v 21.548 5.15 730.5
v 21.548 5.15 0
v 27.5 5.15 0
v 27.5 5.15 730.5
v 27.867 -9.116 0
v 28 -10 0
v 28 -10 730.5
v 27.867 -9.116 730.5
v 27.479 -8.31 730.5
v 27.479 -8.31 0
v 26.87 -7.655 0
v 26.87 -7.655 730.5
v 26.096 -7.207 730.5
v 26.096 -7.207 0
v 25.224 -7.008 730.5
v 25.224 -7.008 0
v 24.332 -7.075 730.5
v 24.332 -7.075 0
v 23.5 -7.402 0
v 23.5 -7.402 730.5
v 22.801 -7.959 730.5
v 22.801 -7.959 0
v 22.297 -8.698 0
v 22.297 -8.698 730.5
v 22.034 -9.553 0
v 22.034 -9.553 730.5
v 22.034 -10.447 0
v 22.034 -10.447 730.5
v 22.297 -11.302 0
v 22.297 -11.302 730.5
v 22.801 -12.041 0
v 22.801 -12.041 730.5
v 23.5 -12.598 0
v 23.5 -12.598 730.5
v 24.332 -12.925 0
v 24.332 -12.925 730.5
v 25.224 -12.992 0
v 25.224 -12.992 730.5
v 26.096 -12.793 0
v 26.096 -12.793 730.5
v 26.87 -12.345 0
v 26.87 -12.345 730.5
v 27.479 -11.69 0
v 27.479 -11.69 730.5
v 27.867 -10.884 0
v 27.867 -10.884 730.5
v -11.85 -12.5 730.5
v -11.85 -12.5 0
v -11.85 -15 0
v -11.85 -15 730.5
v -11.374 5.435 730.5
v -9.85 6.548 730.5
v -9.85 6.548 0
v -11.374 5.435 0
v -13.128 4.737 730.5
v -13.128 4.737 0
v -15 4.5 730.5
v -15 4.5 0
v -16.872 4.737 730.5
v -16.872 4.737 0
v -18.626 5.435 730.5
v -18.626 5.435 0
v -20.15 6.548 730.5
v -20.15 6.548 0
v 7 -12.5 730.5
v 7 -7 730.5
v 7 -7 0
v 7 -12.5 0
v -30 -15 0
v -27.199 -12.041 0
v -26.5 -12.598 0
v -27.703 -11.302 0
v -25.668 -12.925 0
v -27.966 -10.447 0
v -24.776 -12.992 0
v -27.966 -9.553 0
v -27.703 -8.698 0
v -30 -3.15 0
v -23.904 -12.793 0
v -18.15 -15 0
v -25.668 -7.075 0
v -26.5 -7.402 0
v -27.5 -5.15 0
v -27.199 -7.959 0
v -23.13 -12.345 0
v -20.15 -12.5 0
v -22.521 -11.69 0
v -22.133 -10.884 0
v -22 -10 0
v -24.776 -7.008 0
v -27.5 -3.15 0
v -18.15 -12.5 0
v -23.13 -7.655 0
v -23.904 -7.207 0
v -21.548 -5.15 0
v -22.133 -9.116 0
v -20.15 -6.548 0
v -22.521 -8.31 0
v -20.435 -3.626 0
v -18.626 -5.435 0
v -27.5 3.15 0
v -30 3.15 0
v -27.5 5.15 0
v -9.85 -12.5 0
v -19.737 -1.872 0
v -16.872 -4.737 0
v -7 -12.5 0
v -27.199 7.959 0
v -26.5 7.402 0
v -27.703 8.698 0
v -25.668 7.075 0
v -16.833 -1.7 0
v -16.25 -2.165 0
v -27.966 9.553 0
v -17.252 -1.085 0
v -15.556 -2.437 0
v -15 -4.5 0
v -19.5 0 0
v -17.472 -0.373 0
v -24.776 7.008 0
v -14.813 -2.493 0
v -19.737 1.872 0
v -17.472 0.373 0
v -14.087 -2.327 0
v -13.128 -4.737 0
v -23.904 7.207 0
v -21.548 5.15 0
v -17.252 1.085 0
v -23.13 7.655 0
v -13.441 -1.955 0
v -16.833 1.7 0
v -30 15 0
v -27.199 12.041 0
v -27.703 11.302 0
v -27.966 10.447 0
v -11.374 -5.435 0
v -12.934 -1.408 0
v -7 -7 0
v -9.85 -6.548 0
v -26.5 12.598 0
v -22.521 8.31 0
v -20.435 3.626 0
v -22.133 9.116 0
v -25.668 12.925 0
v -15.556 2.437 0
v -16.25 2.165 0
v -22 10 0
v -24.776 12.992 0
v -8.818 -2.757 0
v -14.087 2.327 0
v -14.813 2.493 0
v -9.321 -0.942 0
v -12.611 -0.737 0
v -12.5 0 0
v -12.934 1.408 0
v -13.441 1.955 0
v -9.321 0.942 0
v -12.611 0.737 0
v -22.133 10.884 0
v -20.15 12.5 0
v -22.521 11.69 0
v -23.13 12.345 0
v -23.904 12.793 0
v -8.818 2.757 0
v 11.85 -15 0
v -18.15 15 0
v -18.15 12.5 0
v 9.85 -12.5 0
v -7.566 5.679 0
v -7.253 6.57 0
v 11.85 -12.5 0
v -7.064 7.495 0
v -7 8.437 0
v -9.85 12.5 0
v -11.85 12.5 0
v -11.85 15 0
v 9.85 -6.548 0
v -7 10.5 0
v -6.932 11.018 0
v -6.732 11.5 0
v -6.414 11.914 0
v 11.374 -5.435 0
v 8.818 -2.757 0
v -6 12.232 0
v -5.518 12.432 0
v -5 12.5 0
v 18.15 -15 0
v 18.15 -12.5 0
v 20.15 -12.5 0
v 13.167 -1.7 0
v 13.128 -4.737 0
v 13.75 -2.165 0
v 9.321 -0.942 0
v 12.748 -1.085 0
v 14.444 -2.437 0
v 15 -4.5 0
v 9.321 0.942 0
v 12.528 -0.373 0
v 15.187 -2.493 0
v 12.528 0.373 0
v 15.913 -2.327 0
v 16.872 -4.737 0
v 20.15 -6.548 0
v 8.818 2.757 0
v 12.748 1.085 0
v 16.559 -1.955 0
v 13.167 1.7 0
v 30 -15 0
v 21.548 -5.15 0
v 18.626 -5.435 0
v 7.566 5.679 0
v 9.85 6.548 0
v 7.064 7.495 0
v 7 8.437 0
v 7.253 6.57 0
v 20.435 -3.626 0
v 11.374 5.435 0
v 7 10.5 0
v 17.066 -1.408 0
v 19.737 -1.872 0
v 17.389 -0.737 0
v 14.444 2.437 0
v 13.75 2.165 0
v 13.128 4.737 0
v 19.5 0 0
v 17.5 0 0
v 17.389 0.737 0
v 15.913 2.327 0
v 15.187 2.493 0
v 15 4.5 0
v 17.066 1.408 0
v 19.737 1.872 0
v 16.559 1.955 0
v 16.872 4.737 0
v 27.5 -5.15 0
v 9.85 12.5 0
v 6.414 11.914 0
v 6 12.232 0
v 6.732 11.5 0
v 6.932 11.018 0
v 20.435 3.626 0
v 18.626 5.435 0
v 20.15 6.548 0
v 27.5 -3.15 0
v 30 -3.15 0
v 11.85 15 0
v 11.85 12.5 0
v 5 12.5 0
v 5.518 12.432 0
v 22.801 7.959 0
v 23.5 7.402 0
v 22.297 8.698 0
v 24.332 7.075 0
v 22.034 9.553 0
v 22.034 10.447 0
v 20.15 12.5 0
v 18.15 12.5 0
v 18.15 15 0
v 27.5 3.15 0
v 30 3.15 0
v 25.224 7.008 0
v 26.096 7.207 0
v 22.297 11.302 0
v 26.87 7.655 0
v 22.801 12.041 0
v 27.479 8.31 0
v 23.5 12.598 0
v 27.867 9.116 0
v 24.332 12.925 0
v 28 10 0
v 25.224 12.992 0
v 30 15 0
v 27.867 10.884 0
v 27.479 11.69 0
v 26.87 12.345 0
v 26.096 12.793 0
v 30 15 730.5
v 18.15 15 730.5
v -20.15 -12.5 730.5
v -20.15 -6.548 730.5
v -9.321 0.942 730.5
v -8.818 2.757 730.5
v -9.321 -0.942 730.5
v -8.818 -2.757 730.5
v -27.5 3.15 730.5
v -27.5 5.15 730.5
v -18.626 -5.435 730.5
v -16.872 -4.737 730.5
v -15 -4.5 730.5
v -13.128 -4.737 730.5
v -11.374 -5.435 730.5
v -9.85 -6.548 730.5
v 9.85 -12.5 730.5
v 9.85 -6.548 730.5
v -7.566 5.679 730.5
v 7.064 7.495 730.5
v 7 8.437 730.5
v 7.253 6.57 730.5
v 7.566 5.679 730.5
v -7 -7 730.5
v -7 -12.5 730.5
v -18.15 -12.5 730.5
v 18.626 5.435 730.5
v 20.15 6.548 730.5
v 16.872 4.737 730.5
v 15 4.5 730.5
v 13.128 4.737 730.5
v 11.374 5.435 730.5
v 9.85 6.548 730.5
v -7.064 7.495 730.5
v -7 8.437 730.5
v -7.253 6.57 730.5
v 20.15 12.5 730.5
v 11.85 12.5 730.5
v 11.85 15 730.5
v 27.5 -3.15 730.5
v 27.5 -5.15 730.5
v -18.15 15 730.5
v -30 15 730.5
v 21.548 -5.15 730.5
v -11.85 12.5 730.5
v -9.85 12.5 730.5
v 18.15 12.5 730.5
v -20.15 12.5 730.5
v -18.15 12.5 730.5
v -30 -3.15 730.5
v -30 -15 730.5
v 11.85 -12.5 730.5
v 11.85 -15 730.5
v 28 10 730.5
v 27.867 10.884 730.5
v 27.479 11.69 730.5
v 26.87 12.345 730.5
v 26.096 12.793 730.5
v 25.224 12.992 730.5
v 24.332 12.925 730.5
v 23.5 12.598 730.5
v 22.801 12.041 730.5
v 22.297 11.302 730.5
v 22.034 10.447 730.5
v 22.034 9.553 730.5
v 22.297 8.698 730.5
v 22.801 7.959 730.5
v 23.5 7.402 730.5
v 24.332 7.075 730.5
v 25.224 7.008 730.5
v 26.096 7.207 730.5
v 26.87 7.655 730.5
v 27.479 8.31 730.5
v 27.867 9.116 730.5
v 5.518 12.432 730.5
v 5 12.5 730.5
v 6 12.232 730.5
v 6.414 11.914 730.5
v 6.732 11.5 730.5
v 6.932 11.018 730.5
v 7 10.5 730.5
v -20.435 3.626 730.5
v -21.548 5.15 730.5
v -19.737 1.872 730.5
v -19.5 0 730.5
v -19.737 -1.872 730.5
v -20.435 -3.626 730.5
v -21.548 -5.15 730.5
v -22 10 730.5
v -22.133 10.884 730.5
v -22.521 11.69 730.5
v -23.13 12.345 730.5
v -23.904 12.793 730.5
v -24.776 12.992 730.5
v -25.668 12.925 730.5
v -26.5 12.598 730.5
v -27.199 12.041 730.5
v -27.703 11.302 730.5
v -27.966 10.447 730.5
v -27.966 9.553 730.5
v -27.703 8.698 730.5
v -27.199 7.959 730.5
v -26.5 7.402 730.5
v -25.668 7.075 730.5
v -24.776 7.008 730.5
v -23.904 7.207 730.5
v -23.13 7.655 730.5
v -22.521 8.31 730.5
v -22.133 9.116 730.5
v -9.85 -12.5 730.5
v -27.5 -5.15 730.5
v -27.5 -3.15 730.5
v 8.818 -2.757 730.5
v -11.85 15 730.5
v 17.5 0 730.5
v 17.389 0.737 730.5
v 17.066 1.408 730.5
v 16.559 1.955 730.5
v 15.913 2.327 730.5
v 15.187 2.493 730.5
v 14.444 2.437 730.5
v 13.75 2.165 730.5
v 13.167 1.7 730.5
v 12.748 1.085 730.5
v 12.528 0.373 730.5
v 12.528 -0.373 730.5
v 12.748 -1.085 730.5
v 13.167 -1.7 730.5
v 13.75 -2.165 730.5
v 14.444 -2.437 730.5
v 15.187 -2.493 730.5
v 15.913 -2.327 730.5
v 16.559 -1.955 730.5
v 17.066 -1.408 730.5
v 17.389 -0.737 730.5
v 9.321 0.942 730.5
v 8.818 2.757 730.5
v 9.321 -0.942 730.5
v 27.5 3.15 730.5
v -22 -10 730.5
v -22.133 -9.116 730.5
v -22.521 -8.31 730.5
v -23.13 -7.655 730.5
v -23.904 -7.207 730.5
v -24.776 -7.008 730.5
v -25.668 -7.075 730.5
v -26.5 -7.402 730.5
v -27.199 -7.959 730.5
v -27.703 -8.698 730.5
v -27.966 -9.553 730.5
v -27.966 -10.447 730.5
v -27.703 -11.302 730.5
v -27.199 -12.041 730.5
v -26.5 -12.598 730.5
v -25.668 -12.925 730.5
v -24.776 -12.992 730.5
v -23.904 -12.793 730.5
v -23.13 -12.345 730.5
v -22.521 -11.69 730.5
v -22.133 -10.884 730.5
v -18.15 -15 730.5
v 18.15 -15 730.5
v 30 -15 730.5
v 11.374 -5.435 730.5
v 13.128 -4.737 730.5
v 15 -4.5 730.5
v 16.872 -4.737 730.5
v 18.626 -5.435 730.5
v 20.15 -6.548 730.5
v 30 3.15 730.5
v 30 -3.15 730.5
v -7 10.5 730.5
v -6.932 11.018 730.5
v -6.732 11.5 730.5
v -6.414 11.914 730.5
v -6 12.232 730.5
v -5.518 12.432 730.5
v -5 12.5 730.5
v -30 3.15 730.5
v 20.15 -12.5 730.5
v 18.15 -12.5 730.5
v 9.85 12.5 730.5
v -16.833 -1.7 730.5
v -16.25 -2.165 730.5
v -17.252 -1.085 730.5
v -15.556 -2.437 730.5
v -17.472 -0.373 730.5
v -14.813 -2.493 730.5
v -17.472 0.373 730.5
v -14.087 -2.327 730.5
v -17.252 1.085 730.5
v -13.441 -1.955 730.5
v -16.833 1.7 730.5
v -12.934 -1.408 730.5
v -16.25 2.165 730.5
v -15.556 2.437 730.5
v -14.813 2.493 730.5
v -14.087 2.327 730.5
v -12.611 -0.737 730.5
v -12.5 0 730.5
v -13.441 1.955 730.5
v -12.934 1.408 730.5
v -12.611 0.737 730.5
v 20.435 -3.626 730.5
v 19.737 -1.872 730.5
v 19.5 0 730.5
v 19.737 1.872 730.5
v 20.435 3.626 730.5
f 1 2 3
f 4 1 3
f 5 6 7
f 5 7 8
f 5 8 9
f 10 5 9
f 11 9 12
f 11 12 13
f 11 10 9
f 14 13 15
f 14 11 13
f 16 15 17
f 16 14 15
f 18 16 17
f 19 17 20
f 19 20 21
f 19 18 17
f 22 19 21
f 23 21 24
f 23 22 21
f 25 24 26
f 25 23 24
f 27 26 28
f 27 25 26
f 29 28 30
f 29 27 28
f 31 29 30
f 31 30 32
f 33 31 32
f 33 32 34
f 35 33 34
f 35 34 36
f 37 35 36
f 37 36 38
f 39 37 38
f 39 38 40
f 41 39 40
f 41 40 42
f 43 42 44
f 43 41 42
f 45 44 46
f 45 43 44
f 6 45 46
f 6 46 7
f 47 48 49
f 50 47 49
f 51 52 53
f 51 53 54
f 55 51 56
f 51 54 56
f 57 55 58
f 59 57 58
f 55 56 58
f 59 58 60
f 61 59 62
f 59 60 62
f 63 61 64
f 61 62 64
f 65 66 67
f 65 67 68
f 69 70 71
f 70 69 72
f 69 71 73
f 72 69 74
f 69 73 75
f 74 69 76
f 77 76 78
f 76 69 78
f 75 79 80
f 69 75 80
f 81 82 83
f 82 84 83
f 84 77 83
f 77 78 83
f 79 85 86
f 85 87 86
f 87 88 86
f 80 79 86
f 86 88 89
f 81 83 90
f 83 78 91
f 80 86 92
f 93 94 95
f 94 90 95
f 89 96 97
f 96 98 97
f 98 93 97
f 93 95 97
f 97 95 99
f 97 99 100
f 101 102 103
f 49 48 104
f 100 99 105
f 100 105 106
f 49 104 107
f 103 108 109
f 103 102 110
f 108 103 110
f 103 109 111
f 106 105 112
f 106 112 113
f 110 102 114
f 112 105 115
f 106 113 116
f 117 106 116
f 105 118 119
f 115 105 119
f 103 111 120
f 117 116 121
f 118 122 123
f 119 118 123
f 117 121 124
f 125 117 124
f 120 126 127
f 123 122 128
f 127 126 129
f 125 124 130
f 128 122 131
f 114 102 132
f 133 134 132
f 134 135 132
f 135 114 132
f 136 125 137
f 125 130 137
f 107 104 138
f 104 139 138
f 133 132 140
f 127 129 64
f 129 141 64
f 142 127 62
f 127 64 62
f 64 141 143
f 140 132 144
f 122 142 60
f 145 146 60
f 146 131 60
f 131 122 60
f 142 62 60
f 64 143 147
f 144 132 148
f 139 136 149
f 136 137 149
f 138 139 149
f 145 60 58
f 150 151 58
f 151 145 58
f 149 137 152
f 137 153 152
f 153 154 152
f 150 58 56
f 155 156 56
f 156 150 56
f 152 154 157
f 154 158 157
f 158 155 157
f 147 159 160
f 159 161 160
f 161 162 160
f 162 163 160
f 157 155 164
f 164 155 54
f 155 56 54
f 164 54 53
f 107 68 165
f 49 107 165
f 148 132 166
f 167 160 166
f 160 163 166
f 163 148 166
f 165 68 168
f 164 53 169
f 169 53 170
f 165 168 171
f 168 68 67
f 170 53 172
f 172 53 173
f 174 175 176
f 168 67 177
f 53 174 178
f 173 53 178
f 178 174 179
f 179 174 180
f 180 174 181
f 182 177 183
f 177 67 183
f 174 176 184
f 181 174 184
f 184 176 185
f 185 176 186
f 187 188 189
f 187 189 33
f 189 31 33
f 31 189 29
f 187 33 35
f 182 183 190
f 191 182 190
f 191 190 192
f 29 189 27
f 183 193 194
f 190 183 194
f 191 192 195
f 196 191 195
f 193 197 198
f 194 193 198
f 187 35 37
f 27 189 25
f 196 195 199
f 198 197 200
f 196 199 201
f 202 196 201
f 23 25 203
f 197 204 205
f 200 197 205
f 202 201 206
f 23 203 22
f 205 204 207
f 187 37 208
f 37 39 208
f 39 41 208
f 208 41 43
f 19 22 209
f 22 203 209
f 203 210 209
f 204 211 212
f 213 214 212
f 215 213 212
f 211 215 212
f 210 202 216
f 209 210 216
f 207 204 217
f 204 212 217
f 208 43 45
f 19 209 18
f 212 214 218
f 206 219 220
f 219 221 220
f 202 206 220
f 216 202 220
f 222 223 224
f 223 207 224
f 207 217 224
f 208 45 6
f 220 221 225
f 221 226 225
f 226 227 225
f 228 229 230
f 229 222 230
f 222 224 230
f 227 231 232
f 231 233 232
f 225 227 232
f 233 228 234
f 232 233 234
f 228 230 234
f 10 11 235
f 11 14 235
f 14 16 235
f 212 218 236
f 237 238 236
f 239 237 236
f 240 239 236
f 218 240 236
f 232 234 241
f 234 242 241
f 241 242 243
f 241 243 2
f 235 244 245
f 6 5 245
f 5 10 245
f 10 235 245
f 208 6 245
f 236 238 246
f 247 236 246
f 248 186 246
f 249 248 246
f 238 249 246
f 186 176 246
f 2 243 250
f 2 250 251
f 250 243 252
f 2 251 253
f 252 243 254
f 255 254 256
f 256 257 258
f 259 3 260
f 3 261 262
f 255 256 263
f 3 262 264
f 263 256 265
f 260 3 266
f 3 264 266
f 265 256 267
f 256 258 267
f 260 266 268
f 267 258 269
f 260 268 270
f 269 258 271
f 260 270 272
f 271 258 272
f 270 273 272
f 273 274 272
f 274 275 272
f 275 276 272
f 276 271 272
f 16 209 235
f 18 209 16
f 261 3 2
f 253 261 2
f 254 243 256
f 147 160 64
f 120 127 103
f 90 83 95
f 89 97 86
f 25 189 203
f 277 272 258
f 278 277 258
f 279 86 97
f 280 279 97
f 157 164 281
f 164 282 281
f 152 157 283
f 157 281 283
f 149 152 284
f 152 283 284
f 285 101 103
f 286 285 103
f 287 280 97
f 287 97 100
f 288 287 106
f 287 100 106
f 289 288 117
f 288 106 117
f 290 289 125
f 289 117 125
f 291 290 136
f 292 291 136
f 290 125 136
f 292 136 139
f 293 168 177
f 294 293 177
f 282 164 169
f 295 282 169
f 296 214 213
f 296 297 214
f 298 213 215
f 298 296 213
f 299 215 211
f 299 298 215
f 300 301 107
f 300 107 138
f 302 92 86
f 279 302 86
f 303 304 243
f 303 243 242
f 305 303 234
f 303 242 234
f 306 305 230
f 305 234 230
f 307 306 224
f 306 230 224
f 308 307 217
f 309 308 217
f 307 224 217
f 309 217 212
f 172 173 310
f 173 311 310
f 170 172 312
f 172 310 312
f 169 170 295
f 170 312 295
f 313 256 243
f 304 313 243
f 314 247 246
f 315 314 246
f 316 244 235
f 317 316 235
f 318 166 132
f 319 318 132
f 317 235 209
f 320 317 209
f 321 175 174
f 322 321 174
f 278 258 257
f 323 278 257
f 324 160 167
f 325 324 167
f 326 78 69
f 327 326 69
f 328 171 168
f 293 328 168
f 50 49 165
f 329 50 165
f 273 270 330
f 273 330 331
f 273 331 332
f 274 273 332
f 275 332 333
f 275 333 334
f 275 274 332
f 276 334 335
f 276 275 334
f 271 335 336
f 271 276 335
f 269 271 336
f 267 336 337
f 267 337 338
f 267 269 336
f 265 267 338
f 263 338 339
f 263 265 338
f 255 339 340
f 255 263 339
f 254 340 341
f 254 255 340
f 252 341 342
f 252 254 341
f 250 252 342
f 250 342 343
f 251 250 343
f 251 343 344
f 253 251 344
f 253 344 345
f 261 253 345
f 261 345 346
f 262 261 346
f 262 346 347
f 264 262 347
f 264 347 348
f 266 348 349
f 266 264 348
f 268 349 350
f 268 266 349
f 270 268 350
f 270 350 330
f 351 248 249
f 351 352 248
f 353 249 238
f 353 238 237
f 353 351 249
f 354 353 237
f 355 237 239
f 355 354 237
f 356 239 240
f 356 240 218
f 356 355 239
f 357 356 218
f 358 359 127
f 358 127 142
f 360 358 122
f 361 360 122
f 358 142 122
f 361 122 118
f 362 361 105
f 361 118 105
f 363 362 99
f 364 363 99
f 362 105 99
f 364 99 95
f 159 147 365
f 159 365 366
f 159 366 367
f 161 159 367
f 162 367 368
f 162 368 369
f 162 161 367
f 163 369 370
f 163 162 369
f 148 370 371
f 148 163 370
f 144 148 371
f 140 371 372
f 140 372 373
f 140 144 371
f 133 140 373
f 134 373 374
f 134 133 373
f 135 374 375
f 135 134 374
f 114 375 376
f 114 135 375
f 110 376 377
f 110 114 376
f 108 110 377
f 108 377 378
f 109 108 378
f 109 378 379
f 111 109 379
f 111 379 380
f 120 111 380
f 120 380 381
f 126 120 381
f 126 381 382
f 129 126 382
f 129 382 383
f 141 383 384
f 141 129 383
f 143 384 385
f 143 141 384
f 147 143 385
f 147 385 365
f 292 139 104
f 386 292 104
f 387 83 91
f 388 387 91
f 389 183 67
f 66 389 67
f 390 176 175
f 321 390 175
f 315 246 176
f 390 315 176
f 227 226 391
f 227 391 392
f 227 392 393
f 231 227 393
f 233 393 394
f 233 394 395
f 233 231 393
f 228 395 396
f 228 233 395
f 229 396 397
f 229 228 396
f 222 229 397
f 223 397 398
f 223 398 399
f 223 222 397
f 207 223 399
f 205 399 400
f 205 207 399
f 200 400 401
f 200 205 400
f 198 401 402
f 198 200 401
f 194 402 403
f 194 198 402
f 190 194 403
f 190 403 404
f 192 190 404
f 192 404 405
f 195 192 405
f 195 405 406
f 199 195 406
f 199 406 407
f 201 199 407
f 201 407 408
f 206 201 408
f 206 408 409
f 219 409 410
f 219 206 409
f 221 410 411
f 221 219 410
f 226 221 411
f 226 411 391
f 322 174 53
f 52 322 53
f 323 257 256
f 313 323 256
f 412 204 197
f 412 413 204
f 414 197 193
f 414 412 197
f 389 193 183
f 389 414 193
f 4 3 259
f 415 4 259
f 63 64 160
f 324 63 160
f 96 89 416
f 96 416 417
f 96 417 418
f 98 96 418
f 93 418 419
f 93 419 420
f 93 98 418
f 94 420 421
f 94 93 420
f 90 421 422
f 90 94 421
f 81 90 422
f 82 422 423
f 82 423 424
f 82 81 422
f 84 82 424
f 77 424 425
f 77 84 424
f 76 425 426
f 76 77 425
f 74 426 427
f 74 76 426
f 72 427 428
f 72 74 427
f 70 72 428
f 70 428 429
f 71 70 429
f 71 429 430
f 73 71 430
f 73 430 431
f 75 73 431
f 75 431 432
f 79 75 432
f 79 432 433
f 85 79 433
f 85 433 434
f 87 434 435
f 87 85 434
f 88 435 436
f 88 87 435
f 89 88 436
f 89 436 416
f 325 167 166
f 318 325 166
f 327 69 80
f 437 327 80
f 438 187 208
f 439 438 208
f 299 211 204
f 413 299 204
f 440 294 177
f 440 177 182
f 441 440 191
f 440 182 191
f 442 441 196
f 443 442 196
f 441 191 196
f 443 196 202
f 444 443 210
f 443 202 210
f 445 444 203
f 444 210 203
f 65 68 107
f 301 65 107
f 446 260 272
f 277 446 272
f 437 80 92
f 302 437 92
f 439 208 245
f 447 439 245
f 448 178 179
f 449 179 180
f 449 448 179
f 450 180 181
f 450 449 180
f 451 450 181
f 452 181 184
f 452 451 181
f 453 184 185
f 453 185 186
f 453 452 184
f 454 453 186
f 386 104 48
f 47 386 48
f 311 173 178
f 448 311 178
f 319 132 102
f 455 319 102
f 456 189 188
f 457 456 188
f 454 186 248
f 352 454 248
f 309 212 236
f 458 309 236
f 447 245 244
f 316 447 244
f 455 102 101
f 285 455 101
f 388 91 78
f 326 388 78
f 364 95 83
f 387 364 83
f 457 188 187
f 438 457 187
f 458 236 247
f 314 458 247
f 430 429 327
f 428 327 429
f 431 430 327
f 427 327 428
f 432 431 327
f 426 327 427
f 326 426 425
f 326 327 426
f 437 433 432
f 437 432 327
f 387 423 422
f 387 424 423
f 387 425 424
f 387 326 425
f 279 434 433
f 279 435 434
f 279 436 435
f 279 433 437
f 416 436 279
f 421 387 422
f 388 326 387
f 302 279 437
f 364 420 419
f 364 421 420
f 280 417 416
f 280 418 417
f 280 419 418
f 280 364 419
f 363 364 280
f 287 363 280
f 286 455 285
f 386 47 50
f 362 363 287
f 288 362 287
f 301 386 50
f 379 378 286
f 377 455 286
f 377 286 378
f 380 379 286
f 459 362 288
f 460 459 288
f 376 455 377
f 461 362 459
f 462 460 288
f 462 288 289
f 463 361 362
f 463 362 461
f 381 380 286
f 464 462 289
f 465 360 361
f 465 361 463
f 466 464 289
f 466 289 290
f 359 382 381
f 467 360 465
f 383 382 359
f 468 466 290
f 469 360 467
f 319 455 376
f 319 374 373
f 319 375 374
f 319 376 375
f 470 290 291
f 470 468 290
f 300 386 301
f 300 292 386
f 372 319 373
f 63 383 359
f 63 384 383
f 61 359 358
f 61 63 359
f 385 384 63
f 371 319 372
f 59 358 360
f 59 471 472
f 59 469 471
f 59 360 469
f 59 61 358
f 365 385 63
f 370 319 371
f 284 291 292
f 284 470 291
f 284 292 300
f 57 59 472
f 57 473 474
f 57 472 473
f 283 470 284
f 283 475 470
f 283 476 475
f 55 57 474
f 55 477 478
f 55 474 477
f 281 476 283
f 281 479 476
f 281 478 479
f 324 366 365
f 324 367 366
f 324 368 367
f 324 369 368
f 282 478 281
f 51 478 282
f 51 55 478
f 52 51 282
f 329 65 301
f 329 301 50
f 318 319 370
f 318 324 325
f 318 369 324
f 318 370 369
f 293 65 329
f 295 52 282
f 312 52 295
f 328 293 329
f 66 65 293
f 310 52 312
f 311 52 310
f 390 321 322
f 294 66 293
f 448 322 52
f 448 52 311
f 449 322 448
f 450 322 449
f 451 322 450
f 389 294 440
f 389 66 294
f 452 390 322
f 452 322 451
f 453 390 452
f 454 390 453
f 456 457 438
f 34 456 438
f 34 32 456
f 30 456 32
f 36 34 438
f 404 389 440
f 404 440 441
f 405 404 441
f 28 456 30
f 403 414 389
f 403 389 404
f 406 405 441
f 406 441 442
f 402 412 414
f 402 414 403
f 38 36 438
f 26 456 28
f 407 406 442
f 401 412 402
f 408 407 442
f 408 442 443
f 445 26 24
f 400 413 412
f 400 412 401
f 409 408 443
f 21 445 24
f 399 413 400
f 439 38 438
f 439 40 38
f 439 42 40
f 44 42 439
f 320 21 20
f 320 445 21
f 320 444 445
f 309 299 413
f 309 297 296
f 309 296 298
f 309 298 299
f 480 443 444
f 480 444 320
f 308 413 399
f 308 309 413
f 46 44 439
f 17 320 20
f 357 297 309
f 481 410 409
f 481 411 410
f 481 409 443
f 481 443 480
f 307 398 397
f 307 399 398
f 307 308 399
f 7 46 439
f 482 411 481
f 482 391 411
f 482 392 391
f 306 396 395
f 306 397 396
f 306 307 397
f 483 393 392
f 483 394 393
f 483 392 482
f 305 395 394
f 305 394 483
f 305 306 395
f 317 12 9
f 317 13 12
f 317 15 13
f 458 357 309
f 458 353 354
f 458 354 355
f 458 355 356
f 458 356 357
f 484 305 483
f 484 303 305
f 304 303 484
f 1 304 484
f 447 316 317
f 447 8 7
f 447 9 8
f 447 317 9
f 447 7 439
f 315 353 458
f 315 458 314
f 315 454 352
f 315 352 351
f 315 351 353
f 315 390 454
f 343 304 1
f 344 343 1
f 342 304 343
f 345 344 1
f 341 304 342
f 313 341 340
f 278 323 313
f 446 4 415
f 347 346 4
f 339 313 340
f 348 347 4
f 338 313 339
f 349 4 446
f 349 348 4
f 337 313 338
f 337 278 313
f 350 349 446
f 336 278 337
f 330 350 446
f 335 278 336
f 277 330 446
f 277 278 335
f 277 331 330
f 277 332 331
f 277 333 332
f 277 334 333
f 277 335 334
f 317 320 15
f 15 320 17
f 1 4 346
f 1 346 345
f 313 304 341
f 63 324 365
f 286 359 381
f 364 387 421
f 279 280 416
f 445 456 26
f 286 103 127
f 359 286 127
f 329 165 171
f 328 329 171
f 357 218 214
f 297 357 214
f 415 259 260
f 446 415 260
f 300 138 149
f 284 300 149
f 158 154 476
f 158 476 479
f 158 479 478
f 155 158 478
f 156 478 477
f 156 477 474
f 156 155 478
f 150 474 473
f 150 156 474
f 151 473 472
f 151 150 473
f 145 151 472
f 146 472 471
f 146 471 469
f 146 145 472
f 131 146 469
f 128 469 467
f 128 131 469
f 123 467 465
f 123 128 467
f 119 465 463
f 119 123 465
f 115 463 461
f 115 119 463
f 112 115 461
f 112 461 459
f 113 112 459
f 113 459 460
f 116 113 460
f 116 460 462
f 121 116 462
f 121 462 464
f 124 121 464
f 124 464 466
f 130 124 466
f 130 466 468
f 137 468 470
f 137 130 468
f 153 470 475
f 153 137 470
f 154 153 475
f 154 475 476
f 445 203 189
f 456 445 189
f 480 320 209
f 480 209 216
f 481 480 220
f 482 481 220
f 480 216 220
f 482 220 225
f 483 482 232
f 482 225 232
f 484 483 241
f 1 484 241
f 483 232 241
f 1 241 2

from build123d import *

# Parameters (mm, degrees)
F0_R     = 3
F0_R_2   = 2.5
F1_DEPTH = 730.5
F2_R     = 2
F3_R     = 7


# Not quite as in the source:
# - a feature names something its author has since deleted; it is built from what else it names


with BuildPart() as f1:
    # F0 (on Top) → F1 (new body)
    with BuildSketch(Plane.XY):
        with BuildLine():
            Line((18.15, -15), (30, -15))
            Line((30, -15), (30, -3.15))
            Line((30, -3.15), (27.5, -3.15))
            Line((27.5, -3.15), (27.5, -5.15))
            Line((27.5, -5.15), (21.5477069044, -5.15))
            ThreePointArc((21.5477069044, -5.15), (19.5, 0), (21.5477069044, 5.15))
            Line((21.5477069044, 5.15), (27.5, 5.15))
            Line((27.5, 5.15), (27.5, 3.15))
            Line((27.5, 3.15), (30, 3.15))
            Line((30, 3.15), (30, 15))
            Line((30, 15), (18.15, 15))
            Line((18.15, 15), (18.15, 12.5))
            Line((18.15, 12.5), (20.15, 12.5))
            Line((20.15, 12.5), (20.15, 6.5477069044))
            ThreePointArc((20.15, 6.5477069044), (15, 4.5), (9.85, 6.5477069044))
            Line((9.85, 6.5477069044), (9.85, 12.5))
            Line((9.85, 12.5), (11.85, 12.5))
            Line((11.85, 12.5), (11.85, 15))
            Line((11.85, 15), (-11.85, 15))
            Line((-11.85, 15), (-11.85, 12.5))
            Line((-11.85, 12.5), (-9.85, 12.5))
            Line((-9.85, 12.5), (-9.85, 6.5477069044))
            ThreePointArc((-9.85, 6.5477069044), (-15, 4.5), (-20.15, 6.5477069044))
            Line((-20.15, 6.5477069044), (-20.15, 12.5))
            Line((-20.15, 12.5), (-18.15, 12.5))
            Line((-18.15, 12.5), (-18.15, 15))
            Line((-18.15, 15), (-30, 15))
            Line((-30, 15), (-30, 3.15))
            Line((-30, 3.15), (-27.5, 3.15))
            Line((-27.5, 3.15), (-27.5, 5.15))
            Line((-27.5, 5.15), (-21.5477069044, 5.15))
            ThreePointArc((-21.5477069044, 5.15), (-19.5, 0), (-21.5477069044, -5.15))
            Line((-21.5477069044, -5.15), (-27.5, -5.15))
            Line((-27.5, -5.15), (-27.5, -3.15))
            Line((-27.5, -3.15), (-30, -3.15))
            Line((-30, -3.15), (-30, -15))
            Line((-30, -15), (-18.15, -15))
            Line((-18.15, -15), (-18.15, -12.5))
            Line((-18.15, -12.5), (-20.15, -12.5))
            Line((-20.15, -12.5), (-20.15, -6.5477069044))
            ThreePointArc((-20.15, -6.5477069044), (-15, -4.5), (-9.85, -6.5477069044))
            Line((-9.85, -6.5477069044), (-9.85, -12.5))
            Line((-9.85, -12.5), (-11.85, -12.5))
            Line((-11.85, -12.5), (-11.85, -15))
            Line((-11.85, -15), (11.85, -15))
            Line((11.85, -15), (11.85, -12.5))
            Line((11.85, -12.5), (9.85, -12.5))
            Line((9.85, -12.5), (9.85, -6.5477069044))
            ThreePointArc((9.85, -6.5477069044), (15, -4.5), (20.15, -6.5477069044))
            Line((20.15, -6.5477069044), (20.15, -12.5))
            Line((20.15, -12.5), (18.15, -12.5))
            Line((18.15, -12.5), (18.15, -15))
        make_face()
        with Locations((-25, -10)):
            Circle(F0_R, mode=Mode.SUBTRACT)
        with Locations((25, -10)):
            Circle(F0_R, mode=Mode.SUBTRACT)
        with Locations((-15, 0)):
            Circle(F0_R_2, mode=Mode.SUBTRACT)
        with Locations((-25, 10)):
            Circle(F0_R, mode=Mode.SUBTRACT)
        Polygon((-7, 7), (-7, 12.5), (0, 12.5), (7, 12.5), (7, 7), (10, 0), (7, -7), (7, -12.5), (0, -12.5), (-7, -12.5), (-7, -7), (-10, 0), align=None, mode=Mode.SUBTRACT)
        with Locations((15, 0)):
            Circle(F0_R_2, mode=Mode.SUBTRACT)
        with Locations((25, 10)):
            Circle(F0_R, mode=Mode.SUBTRACT)
    extrude(amount=F1_DEPTH)

    # F2
    f2_edges = [f1.edges().sort_by_distance(p)[0] for p in [
        (-7, 12.5, 365.25),
        (7, 12.5, 365.25),
    ]]
    fillet(f2_edges, radius=F2_R)

    # F3
    f3_edges = [f1.edges().sort_by_distance(p)[0] for p in [
        (-7, 7, 365.25),
        (-10, 0, 365.25),
        (7, 7, 365.25),
        (10, 0, 365.25),
    ]]
    fillet(f3_edges, radius=F3_R)


solid = f1.part
